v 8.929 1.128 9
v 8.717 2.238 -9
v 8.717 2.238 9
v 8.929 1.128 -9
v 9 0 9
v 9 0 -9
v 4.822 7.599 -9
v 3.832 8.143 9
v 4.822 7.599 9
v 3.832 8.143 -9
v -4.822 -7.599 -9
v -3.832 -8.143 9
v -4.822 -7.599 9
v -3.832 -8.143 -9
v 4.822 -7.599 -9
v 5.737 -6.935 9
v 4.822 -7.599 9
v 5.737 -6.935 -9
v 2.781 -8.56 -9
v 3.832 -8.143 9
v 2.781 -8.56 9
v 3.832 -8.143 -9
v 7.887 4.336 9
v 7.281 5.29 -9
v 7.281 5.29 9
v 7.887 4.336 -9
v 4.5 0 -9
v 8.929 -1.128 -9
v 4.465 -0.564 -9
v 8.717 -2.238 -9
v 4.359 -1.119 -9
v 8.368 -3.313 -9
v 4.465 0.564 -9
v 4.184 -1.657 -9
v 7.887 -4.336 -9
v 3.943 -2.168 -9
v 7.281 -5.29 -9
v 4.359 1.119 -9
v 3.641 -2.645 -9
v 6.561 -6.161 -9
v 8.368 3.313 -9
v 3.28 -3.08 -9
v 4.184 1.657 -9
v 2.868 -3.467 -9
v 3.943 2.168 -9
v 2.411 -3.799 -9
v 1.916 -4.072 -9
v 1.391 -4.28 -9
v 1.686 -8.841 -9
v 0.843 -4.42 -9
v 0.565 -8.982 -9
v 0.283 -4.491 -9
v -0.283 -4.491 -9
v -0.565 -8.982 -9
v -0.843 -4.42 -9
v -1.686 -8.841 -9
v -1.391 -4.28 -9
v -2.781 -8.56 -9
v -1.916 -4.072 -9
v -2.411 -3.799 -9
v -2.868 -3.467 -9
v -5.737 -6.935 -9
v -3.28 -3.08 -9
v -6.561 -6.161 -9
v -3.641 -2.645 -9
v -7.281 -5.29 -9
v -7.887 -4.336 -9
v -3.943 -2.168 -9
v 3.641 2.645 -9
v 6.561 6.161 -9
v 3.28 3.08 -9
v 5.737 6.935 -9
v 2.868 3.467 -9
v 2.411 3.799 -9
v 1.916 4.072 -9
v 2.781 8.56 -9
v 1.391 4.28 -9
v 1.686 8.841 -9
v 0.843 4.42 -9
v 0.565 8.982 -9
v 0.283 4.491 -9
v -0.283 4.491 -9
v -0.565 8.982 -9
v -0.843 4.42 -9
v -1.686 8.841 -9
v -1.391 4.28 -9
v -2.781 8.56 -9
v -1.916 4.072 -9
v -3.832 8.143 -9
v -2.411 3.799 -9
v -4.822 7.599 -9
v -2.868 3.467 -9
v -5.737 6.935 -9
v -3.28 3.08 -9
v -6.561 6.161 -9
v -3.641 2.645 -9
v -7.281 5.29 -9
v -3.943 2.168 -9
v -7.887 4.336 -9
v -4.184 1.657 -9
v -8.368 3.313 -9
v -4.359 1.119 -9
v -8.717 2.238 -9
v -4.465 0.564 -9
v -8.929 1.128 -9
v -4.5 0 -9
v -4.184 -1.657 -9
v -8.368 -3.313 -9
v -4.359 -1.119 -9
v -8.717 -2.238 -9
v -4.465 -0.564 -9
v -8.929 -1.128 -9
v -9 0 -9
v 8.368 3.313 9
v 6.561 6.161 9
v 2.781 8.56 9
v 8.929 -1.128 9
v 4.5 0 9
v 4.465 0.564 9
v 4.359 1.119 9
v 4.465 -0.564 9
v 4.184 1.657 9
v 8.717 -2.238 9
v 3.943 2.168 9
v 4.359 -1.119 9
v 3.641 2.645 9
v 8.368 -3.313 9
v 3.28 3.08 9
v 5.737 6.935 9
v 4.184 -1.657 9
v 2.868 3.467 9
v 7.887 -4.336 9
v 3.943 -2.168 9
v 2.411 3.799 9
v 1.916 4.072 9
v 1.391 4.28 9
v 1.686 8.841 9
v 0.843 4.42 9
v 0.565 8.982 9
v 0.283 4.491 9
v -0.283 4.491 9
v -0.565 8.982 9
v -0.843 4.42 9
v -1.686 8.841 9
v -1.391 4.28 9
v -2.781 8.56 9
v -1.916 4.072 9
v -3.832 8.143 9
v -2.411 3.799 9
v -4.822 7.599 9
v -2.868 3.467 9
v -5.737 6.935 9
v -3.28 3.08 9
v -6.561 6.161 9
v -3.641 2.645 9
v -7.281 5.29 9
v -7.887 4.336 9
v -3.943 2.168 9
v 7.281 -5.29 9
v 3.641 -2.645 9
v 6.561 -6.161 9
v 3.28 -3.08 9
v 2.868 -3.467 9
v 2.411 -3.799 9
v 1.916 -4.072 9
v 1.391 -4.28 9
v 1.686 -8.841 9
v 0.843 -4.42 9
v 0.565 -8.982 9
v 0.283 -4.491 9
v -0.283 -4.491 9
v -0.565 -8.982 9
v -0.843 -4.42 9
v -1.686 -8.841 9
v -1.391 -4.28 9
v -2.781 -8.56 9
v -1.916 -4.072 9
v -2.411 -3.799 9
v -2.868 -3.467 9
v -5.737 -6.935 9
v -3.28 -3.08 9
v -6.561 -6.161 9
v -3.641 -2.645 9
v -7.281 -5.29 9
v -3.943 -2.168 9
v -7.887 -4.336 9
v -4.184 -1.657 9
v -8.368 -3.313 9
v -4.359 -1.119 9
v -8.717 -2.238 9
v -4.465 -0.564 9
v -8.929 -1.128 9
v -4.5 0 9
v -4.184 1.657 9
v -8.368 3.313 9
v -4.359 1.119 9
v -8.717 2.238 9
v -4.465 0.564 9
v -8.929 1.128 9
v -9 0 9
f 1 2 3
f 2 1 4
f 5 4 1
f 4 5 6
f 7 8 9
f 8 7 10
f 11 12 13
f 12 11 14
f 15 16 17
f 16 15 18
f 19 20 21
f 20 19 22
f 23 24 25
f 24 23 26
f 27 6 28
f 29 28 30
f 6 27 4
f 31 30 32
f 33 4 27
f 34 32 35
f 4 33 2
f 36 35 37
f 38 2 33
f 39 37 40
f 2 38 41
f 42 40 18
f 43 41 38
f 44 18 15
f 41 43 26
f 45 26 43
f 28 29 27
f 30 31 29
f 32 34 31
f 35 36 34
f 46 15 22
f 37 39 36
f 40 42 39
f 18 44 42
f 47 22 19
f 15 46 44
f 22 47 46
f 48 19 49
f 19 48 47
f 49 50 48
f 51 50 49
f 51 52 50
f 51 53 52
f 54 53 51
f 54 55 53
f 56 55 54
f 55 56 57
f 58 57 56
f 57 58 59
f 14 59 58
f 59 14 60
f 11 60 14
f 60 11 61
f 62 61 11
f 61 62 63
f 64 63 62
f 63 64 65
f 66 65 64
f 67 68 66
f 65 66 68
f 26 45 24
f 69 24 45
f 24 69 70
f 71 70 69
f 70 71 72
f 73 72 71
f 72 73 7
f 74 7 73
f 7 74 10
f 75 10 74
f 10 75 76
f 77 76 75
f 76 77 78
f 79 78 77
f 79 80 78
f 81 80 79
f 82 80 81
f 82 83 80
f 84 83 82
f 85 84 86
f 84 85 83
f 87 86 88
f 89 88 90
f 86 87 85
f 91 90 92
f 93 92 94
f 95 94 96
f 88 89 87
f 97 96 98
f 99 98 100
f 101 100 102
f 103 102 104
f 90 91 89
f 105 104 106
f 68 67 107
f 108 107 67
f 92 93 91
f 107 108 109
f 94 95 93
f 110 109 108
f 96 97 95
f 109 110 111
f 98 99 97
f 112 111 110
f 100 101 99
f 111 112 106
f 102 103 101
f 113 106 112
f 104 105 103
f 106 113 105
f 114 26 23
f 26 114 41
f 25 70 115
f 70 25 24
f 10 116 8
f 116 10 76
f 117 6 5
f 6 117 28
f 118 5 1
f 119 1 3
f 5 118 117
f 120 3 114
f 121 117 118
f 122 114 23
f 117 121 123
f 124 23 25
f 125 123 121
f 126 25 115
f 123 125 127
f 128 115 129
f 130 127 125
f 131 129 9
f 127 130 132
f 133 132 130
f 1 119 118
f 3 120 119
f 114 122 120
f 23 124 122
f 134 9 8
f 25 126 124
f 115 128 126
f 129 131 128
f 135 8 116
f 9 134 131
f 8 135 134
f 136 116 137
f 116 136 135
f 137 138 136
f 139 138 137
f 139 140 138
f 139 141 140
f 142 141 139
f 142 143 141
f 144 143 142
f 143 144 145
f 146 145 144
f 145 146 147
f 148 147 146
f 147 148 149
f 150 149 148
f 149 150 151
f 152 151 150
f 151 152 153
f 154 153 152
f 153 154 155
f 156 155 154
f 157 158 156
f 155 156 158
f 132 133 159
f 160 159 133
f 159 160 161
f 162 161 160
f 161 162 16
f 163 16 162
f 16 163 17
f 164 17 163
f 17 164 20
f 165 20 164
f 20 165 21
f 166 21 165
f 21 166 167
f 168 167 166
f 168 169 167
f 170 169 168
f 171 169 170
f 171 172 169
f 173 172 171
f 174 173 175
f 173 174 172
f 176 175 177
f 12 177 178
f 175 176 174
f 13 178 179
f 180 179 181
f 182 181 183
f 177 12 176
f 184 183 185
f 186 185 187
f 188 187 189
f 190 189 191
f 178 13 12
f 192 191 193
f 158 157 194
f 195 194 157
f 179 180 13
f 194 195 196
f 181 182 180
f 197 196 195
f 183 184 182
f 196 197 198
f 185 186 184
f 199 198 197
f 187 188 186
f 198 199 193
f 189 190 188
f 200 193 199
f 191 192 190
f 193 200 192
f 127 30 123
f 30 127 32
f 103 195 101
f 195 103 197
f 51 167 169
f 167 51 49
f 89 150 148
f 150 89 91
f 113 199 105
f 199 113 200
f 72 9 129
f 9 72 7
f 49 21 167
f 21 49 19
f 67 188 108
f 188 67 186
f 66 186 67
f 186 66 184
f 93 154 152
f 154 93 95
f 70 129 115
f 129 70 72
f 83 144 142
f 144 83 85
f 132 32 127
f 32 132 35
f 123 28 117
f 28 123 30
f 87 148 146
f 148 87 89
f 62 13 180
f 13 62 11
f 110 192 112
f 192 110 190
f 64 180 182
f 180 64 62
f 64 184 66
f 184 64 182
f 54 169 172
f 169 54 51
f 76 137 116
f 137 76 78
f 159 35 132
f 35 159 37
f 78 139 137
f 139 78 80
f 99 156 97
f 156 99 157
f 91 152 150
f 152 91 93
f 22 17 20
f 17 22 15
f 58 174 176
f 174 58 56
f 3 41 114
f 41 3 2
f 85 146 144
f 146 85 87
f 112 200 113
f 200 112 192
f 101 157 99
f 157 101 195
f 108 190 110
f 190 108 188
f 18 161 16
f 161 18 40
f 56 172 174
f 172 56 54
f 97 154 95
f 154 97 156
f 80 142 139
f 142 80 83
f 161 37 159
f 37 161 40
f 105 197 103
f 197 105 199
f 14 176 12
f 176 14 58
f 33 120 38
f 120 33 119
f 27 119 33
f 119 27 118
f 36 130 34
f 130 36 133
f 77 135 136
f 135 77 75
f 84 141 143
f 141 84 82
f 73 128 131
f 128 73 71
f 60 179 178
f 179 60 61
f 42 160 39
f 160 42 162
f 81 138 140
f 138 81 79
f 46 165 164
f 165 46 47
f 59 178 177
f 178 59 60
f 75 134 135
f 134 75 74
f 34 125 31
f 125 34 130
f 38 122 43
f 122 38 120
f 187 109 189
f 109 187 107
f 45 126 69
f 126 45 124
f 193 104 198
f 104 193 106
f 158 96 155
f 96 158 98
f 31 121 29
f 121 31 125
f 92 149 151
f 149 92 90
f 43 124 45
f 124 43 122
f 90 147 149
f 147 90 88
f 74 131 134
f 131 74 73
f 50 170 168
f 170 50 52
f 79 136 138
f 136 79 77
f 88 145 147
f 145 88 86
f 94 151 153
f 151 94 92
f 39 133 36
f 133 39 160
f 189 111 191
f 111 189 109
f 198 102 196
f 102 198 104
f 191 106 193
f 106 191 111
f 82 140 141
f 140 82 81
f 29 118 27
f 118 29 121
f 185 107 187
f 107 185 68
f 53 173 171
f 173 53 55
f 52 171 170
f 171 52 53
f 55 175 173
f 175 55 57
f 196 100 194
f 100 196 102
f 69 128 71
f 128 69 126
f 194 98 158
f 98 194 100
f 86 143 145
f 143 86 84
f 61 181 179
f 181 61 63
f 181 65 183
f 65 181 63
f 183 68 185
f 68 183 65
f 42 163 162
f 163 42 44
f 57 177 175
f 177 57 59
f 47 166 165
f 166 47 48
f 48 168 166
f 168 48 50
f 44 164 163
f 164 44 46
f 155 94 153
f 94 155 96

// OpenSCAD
$fn = 50;


difference() {
	union() {
		translate(v = [0, 0, -9.0000000000]) {
			cylinder(h = 18, r = 9.0000000000);
		}
	}
	union() {
		translate(v = [0, 0, -100.0000000000]) {
			cylinder(h = 200, r = 4.5000000000);
		}
	}
}
